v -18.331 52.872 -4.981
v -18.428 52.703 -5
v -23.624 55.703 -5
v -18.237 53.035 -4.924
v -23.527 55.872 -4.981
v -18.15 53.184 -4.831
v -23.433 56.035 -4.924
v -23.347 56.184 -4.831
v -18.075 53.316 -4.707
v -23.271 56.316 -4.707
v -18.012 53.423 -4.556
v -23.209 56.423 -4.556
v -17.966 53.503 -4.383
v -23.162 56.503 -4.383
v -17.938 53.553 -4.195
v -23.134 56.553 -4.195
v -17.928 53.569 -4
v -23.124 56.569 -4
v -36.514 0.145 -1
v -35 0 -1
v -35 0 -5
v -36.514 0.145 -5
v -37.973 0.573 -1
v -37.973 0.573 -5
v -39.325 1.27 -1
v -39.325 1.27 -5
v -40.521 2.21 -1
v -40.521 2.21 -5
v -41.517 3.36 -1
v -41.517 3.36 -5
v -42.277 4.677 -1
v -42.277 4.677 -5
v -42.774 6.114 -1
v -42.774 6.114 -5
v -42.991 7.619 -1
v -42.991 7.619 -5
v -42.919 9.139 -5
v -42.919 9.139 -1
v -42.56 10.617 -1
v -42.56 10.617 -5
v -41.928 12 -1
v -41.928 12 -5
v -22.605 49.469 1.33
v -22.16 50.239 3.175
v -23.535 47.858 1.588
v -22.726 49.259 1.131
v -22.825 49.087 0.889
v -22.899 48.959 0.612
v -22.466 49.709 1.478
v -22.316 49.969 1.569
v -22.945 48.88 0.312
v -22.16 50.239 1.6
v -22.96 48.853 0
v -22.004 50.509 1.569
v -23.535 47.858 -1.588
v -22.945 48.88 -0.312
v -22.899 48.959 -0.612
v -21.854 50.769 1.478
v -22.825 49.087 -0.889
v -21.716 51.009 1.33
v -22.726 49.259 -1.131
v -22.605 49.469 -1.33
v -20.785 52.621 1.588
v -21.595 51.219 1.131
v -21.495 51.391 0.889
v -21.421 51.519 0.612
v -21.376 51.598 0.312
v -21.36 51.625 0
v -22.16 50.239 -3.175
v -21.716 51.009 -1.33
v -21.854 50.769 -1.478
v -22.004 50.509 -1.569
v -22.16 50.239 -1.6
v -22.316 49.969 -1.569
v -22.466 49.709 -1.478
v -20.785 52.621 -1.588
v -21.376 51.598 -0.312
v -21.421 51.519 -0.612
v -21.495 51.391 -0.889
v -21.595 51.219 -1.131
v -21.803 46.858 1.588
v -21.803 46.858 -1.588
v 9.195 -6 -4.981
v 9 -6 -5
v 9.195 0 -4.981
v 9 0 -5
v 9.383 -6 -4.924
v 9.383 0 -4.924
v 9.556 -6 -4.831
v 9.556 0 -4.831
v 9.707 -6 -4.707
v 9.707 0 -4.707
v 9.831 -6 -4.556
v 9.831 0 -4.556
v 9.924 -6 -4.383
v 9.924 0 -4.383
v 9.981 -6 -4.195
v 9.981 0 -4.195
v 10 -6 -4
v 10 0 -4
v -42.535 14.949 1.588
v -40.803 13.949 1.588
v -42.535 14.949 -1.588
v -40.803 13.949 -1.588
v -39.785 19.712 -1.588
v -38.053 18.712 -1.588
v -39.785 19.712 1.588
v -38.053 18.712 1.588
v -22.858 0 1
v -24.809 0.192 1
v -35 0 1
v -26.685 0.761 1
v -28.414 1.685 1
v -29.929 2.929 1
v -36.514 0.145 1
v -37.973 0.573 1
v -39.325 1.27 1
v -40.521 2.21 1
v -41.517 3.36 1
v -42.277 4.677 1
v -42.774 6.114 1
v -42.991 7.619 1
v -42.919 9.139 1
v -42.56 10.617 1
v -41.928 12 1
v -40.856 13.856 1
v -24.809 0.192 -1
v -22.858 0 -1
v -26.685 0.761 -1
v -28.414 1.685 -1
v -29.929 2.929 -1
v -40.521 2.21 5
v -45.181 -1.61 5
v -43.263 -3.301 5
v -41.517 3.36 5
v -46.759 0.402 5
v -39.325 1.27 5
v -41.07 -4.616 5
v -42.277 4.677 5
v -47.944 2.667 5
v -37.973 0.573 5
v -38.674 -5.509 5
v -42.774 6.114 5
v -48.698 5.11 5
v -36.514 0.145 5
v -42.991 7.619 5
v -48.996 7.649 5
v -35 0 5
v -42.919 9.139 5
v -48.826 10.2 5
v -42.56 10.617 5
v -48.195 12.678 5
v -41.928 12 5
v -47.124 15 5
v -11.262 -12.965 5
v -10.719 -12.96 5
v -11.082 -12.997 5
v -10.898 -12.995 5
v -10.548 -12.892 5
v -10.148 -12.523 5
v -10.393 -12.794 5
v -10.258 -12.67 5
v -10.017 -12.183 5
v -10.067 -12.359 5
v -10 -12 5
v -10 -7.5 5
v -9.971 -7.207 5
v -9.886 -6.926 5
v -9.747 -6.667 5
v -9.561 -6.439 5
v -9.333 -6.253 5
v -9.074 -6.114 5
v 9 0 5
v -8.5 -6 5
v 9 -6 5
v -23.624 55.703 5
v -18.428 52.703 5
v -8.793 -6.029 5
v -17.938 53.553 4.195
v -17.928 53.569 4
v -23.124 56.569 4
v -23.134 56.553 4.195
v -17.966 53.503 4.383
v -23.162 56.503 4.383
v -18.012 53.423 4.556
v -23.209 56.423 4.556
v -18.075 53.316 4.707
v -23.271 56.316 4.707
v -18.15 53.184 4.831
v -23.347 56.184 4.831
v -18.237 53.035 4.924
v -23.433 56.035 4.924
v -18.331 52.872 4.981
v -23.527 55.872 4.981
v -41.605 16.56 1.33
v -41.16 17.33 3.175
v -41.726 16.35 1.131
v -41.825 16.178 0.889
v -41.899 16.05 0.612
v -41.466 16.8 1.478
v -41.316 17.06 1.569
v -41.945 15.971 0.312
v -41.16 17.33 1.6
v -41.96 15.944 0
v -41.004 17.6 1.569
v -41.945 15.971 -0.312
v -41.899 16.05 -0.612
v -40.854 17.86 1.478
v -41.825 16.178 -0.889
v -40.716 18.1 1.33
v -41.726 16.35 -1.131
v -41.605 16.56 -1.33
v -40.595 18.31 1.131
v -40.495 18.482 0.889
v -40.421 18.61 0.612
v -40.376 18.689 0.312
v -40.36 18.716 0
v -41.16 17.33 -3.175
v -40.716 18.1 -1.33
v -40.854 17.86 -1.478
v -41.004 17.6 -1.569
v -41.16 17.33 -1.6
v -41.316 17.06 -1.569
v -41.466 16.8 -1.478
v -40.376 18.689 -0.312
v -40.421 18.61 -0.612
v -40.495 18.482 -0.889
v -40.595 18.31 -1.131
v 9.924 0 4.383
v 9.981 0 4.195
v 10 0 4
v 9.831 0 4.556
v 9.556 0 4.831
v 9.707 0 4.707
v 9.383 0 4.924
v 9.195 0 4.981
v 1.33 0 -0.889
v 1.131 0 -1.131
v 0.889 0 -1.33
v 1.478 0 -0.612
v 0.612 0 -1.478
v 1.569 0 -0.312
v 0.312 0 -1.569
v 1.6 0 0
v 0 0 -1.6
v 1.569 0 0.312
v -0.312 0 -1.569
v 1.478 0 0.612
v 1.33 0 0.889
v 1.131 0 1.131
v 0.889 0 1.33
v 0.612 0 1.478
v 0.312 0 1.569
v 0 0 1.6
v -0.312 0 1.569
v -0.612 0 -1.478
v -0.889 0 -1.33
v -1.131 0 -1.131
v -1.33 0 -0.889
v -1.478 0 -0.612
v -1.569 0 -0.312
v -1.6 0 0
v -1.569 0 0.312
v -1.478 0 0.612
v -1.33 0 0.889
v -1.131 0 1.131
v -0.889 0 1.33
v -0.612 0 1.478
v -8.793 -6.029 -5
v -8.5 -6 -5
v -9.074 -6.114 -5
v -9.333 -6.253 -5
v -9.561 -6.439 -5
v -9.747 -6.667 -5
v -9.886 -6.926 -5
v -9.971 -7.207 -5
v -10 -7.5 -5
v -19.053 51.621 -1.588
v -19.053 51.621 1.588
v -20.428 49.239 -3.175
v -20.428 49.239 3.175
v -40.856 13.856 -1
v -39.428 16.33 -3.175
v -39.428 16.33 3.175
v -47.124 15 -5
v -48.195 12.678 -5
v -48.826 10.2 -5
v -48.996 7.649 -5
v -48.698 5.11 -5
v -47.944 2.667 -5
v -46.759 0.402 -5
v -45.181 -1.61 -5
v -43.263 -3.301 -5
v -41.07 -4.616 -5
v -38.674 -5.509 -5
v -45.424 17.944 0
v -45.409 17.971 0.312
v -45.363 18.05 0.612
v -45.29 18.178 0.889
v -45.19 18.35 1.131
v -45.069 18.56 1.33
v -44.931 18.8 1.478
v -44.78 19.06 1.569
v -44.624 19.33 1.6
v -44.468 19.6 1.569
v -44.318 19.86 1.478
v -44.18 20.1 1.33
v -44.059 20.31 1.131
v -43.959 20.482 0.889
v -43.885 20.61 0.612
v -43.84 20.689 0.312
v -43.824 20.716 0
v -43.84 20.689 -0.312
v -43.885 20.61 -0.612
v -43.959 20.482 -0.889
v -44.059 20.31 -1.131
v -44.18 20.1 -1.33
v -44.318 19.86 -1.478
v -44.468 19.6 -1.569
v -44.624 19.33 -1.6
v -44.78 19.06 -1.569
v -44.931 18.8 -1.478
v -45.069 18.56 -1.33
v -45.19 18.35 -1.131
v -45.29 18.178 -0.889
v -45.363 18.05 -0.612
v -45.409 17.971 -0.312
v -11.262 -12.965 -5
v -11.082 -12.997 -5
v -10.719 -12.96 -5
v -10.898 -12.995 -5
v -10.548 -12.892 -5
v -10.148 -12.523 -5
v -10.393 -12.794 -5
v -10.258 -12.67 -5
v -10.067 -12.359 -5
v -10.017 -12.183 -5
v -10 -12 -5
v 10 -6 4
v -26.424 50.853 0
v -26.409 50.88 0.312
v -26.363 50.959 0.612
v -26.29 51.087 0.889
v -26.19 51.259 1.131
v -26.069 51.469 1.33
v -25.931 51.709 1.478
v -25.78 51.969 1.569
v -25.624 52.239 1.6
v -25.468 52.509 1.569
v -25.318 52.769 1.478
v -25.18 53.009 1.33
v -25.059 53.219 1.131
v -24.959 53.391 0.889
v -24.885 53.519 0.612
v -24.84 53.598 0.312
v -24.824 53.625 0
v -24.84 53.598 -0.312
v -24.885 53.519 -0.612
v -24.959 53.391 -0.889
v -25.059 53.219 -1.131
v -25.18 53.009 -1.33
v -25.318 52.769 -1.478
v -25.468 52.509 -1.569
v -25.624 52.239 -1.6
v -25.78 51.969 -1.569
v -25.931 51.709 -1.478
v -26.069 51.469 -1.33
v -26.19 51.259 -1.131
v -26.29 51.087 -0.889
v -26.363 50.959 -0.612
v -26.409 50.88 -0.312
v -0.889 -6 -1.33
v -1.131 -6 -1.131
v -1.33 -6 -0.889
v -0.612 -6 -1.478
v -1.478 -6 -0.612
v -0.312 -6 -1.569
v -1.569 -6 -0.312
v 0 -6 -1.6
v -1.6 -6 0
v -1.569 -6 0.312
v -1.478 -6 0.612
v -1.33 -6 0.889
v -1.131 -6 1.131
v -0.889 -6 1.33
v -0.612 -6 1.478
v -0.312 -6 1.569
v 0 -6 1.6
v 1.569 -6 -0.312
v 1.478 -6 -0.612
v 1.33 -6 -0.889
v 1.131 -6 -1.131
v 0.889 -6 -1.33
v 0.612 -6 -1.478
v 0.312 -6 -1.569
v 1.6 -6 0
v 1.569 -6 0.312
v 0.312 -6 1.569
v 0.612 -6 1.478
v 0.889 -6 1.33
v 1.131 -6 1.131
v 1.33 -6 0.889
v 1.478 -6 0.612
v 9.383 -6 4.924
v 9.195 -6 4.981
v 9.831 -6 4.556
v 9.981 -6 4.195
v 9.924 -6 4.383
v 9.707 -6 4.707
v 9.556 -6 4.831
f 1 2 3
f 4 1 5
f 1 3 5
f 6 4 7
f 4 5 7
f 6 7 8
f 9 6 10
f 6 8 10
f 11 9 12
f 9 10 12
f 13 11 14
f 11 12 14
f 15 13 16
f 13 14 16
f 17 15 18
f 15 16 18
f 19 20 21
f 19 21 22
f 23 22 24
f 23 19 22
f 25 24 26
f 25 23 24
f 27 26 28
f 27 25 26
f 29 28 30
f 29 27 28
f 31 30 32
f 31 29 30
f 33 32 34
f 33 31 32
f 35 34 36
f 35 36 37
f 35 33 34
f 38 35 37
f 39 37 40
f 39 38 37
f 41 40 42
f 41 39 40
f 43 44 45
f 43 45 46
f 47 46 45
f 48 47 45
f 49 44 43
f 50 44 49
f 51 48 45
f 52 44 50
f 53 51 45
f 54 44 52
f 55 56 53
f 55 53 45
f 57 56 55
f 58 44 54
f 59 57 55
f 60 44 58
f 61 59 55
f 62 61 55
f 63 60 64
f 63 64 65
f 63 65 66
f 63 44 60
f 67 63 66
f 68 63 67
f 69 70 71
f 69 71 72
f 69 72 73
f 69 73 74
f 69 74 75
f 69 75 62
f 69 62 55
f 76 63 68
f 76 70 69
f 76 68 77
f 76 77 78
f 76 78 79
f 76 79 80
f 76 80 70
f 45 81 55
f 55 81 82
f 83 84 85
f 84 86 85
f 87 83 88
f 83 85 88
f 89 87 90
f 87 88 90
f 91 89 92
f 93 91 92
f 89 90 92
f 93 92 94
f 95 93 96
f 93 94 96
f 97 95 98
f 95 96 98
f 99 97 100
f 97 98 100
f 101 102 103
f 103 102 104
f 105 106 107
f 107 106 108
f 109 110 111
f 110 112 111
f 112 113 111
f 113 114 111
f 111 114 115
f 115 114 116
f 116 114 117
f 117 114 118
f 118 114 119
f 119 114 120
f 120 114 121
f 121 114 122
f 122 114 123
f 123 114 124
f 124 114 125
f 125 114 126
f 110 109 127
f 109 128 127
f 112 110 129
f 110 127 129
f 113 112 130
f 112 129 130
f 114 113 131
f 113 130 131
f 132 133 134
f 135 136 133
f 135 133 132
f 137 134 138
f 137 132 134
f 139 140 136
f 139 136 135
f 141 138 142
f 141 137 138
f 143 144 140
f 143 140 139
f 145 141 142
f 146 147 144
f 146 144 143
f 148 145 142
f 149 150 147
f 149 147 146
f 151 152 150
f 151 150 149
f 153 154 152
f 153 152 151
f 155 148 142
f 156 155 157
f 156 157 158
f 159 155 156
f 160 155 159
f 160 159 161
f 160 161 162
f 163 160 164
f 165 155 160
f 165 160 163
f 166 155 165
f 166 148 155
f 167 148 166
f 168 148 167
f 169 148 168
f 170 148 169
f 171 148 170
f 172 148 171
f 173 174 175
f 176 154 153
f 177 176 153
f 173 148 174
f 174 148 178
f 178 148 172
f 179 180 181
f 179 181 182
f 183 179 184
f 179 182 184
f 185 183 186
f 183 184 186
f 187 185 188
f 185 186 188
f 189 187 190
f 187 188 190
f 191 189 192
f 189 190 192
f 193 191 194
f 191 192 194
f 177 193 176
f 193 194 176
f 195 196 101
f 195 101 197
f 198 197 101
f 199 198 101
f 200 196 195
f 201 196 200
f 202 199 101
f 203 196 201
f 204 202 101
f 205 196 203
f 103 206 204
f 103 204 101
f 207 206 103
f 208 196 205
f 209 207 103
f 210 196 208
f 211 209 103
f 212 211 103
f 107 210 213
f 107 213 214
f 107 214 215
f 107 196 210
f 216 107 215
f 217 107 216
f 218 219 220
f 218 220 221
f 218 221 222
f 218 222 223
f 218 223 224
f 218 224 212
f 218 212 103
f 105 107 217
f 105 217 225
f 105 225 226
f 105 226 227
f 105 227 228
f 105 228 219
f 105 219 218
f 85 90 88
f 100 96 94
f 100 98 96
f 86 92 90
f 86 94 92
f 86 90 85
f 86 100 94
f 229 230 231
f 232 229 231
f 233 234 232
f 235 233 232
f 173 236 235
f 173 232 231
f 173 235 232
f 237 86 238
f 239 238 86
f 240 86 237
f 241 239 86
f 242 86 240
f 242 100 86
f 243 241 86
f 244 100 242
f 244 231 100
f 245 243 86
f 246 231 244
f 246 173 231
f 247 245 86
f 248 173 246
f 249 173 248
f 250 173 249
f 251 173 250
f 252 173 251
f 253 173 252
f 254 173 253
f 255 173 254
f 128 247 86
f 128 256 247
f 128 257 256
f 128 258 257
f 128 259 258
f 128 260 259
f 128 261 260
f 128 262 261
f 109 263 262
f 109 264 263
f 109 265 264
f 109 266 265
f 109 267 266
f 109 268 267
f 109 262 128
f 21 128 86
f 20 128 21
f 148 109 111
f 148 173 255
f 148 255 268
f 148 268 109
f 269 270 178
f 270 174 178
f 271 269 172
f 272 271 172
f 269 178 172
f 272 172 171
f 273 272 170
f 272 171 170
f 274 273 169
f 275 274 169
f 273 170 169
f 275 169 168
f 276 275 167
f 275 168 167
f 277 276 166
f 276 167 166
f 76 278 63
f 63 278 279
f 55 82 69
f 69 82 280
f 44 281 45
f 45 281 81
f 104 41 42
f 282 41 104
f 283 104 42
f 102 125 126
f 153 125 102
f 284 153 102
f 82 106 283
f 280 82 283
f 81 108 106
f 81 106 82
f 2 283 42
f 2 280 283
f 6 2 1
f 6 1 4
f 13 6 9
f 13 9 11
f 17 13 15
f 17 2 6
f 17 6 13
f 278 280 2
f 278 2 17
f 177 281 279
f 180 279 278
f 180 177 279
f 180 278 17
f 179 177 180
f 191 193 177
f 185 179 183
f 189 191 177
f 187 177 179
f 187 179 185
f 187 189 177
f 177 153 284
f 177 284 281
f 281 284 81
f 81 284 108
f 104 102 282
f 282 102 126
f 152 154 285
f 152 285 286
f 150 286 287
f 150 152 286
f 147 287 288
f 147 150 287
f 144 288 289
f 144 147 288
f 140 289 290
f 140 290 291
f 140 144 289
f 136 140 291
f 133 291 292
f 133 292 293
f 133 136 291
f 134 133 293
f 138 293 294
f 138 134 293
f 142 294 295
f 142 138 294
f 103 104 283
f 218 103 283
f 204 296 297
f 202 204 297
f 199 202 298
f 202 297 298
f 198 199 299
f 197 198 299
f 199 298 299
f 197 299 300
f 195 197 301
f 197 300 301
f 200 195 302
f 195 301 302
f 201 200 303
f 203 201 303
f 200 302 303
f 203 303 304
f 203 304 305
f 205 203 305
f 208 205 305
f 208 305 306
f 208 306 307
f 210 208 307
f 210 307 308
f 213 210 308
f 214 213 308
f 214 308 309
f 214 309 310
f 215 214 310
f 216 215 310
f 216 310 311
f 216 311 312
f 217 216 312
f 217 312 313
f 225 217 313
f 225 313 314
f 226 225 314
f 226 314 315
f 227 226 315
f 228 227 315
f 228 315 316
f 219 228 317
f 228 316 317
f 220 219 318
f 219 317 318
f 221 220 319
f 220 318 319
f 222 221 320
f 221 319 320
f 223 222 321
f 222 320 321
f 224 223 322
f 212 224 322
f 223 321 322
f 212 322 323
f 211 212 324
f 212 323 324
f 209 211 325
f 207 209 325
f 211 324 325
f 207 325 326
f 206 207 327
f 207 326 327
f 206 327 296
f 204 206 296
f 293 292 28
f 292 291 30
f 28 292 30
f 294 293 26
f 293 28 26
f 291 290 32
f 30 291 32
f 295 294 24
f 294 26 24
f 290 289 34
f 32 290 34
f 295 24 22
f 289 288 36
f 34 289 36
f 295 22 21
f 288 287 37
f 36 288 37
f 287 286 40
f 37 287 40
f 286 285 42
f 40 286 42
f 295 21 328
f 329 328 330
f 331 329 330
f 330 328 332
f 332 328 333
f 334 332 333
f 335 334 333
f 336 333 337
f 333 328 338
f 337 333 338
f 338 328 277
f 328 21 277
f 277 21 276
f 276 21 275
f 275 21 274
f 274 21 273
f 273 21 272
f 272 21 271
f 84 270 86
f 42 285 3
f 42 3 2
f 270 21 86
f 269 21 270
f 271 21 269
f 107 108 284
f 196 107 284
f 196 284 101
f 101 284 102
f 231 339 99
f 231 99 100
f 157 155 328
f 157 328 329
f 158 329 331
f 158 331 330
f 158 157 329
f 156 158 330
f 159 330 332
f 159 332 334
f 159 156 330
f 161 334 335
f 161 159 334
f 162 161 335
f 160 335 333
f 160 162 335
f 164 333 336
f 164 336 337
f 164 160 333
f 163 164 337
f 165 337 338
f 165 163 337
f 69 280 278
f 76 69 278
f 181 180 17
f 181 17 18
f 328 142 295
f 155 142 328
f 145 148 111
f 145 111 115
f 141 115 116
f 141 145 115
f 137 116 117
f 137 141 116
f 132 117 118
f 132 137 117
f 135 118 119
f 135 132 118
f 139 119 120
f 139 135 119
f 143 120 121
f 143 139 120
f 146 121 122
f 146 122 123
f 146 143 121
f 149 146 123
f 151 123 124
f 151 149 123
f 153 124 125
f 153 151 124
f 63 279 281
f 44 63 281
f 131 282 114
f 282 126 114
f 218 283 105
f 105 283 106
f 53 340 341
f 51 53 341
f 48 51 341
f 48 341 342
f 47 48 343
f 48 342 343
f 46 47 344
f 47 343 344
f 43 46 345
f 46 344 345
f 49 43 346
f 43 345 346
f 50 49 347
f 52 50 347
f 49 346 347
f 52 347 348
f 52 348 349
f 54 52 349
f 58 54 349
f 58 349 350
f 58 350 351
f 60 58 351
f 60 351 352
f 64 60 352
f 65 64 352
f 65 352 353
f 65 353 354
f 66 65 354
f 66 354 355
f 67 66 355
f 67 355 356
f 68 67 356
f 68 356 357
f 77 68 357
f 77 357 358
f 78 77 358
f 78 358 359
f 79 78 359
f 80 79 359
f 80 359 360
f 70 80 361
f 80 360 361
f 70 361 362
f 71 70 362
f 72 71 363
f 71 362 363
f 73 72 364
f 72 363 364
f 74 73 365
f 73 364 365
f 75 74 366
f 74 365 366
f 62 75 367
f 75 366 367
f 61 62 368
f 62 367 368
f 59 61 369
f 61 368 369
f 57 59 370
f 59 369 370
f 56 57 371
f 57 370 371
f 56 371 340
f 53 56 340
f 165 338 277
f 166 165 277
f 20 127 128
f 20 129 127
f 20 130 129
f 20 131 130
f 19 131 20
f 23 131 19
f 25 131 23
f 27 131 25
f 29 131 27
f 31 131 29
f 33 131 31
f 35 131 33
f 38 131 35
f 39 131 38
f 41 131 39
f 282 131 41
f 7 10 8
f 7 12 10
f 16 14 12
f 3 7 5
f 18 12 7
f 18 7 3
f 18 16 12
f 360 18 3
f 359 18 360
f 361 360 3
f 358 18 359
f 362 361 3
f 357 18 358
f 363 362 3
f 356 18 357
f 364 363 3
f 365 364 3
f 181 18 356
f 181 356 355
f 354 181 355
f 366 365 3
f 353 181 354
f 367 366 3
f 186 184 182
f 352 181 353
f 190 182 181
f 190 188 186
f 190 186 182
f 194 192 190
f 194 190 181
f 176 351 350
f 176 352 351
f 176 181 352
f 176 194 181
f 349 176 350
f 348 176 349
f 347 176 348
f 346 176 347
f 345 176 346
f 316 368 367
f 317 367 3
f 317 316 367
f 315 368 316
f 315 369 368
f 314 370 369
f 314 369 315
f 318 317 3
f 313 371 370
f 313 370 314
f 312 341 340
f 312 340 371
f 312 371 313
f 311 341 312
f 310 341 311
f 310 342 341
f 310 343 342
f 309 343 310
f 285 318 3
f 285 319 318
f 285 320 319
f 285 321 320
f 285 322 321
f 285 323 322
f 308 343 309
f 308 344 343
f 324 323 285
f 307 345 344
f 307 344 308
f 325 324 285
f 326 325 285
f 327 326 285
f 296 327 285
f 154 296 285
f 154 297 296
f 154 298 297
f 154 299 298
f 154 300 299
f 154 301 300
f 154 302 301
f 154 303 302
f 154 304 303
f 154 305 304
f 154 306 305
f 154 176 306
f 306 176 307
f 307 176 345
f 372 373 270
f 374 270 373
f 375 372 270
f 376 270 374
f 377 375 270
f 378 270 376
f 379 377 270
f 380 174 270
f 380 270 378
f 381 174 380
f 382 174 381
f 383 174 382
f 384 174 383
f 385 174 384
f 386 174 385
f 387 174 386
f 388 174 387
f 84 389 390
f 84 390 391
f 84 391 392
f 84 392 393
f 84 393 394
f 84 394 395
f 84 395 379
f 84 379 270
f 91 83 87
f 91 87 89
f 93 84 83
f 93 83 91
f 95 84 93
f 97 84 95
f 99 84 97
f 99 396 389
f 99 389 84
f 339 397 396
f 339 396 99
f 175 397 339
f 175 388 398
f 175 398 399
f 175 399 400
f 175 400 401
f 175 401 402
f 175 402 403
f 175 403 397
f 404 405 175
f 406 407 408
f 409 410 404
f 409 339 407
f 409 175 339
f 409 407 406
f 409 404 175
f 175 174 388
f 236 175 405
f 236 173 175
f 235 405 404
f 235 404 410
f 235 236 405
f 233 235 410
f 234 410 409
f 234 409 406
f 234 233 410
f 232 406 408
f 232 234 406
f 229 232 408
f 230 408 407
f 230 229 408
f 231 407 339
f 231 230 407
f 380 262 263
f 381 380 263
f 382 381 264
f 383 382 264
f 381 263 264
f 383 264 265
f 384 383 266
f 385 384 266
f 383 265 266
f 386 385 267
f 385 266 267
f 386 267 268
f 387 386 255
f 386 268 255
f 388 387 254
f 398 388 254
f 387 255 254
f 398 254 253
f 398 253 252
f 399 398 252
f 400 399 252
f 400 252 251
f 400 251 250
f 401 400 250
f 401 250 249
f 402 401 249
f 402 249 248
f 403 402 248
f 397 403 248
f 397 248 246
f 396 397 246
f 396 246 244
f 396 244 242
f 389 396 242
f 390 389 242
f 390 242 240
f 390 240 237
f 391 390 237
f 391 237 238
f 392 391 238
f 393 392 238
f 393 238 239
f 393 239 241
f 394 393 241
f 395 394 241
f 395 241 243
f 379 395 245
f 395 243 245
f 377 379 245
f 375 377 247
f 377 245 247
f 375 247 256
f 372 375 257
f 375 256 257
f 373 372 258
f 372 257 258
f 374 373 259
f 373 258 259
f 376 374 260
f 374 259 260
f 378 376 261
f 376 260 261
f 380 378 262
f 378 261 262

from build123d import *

# Parameters (mm, degrees)
EXTRUDE_1_DEPTH     = 5
SKETCH_2_R          = 1.6
CUT_EXTRUDE_1_DEPTH = 76.007176866
SKETCH_3_R          = 1.6
CUT_EXTRUDE_2_DEPTH = 6
CUT_EXTRUDE_3_DEPTH = 2
FILLET_1_R          = 1
EXTRUDE_2_DEPTH     = 1
FILLET_2_R          = 1.5
FILLET_3_R          = 10


with BuildPart() as part:
    # 草图1 → 凸台-拉伸1 (new, symmetric)
    with BuildSketch(Plane.XY):
        with BuildLine():
            Line((-41.92820323, 12), (-17.92820323, 53.569219382))
            Line((-17.92820323, 53.569219382), (-23.124355653, 56.569219382))
            Line((-23.124355653, 56.569219382), (-47.124355653, 15))
            ThreePointArc((-47.124355653, 15), (-47.94437584, 2.666789511), (-38.674353195, -5.509223834))
            Line((-38.674353195, -5.509223834), (-11.2624538, -12.96494456))
            ThreePointArc((-11.2624538, -12.96494456), (-10.39273309, -12.794497892), (-10, -12))
            Line((-10, -12), (-10, -6))
            Line((-10, -6), (10, -6))
            Line((10, -6), (10, 0))
            Line((10, 0), (-35, 0))
            ThreePointArc((-35, 0), (-41.92820323, 4), (-41.92820323, 12))
        make_face()
    extrude(amount=EXTRUDE_1_DEPTH, both=True)

    # 草图2 → 切除-拉伸1 (cut, through all)
    with BuildSketch(Plane(origin=(0, 0, 0), x_dir=(1, 0, 0), z_dir=(0, 1, 0))):
        with Locations(Location((0, 0, 0), (0, 0, 180))):
            Circle(SKETCH_2_R)
    extrude(amount=-CUT_EXTRUDE_1_DEPTH, mode=Mode.SUBTRACT)

    # 草图3 → 切除-拉伸2 (cut)
    with BuildSketch(Plane(origin=(-41.838457268, 24.155444566, 0), x_dir=(0, 0, 1), z_dir=(-0.8660254037844367, 0.5000000000000036, 0))):
        with Locations(Location((0, 32.42820323, 0), (0, 0, 270))):
            Circle(SKETCH_3_R)
        with Locations(Location((0, -5.57179677, 0), (0, 0, 270))):
            Circle(SKETCH_3_R)
    extrude(amount=-CUT_EXTRUDE_2_DEPTH, mode=Mode.SUBTRACT)

    # 草图4 → 切除-拉伸3 (cut)
    with BuildSketch(Plane(origin=(-36.642304845, 21.155444566, 0), x_dir=(0, 0, -1), z_dir=(0.8660254037844365, -0.5000000000000039, 0))):
        Polygon((1.58771324, 35.17820323), (-1.58771324, 35.17820323), (-3.175426481, 32.42820323), (-1.58771324, 29.67820323), (1.58771324, 29.67820323), (3.175426481, 32.42820323), align=None)
        Polygon((1.58771324, -2.82179677), (-1.58771324, -2.82179677), (-3.175426481, -5.57179677), (-1.58771324, -8.32179677), (1.58771324, -8.32179677), (3.175426481, -5.57179677), align=None)
    extrude(amount=-CUT_EXTRUDE_3_DEPTH, mode=Mode.SUBTRACT)

    # 圆角1
    fillet_1_edges = [part.edges().sort_by_distance(p)[0] for p in [
        (10, -3, -5),
        (-20.526279442, 55.069219382, -5),
        (-20.526279442, 55.069219382, 5),
        (10, -3, 5),
    ]]
    fillet(fillet_1_edges, radius=FILLET_1_R)

    # 草图6 → 凸台-拉伸2 (add, symmetric)
    with BuildSketch(Plane.XY):
        with BuildLine():
            Line((-41.92820323, 12), (-40.856406461, 13.856406461))
            Line((-40.856406461, 13.856406461), (-27, 0))
            Line((-27, 0), (-35, 0))
            ThreePointArc((-35, 0), (-41.92820323, 4), (-41.92820323, 12))
        make_face()
    extrude(amount=EXTRUDE_2_DEPTH, both=True)

    # 圆角2
    fillet_2_edges = [part.edges().sort_by_distance(p)[0] for p in [
        (-10, -6, 0),
    ]]
    fillet(fillet_2_edges, radius=FILLET_2_R)

    # 圆角3
    fillet_3_edges = [part.edges().sort_by_distance(p)[0] for p in [
        (-27, 0, 0),
    ]]
    fillet(fillet_3_edges, radius=FILLET_3_R)


solid = part.part
